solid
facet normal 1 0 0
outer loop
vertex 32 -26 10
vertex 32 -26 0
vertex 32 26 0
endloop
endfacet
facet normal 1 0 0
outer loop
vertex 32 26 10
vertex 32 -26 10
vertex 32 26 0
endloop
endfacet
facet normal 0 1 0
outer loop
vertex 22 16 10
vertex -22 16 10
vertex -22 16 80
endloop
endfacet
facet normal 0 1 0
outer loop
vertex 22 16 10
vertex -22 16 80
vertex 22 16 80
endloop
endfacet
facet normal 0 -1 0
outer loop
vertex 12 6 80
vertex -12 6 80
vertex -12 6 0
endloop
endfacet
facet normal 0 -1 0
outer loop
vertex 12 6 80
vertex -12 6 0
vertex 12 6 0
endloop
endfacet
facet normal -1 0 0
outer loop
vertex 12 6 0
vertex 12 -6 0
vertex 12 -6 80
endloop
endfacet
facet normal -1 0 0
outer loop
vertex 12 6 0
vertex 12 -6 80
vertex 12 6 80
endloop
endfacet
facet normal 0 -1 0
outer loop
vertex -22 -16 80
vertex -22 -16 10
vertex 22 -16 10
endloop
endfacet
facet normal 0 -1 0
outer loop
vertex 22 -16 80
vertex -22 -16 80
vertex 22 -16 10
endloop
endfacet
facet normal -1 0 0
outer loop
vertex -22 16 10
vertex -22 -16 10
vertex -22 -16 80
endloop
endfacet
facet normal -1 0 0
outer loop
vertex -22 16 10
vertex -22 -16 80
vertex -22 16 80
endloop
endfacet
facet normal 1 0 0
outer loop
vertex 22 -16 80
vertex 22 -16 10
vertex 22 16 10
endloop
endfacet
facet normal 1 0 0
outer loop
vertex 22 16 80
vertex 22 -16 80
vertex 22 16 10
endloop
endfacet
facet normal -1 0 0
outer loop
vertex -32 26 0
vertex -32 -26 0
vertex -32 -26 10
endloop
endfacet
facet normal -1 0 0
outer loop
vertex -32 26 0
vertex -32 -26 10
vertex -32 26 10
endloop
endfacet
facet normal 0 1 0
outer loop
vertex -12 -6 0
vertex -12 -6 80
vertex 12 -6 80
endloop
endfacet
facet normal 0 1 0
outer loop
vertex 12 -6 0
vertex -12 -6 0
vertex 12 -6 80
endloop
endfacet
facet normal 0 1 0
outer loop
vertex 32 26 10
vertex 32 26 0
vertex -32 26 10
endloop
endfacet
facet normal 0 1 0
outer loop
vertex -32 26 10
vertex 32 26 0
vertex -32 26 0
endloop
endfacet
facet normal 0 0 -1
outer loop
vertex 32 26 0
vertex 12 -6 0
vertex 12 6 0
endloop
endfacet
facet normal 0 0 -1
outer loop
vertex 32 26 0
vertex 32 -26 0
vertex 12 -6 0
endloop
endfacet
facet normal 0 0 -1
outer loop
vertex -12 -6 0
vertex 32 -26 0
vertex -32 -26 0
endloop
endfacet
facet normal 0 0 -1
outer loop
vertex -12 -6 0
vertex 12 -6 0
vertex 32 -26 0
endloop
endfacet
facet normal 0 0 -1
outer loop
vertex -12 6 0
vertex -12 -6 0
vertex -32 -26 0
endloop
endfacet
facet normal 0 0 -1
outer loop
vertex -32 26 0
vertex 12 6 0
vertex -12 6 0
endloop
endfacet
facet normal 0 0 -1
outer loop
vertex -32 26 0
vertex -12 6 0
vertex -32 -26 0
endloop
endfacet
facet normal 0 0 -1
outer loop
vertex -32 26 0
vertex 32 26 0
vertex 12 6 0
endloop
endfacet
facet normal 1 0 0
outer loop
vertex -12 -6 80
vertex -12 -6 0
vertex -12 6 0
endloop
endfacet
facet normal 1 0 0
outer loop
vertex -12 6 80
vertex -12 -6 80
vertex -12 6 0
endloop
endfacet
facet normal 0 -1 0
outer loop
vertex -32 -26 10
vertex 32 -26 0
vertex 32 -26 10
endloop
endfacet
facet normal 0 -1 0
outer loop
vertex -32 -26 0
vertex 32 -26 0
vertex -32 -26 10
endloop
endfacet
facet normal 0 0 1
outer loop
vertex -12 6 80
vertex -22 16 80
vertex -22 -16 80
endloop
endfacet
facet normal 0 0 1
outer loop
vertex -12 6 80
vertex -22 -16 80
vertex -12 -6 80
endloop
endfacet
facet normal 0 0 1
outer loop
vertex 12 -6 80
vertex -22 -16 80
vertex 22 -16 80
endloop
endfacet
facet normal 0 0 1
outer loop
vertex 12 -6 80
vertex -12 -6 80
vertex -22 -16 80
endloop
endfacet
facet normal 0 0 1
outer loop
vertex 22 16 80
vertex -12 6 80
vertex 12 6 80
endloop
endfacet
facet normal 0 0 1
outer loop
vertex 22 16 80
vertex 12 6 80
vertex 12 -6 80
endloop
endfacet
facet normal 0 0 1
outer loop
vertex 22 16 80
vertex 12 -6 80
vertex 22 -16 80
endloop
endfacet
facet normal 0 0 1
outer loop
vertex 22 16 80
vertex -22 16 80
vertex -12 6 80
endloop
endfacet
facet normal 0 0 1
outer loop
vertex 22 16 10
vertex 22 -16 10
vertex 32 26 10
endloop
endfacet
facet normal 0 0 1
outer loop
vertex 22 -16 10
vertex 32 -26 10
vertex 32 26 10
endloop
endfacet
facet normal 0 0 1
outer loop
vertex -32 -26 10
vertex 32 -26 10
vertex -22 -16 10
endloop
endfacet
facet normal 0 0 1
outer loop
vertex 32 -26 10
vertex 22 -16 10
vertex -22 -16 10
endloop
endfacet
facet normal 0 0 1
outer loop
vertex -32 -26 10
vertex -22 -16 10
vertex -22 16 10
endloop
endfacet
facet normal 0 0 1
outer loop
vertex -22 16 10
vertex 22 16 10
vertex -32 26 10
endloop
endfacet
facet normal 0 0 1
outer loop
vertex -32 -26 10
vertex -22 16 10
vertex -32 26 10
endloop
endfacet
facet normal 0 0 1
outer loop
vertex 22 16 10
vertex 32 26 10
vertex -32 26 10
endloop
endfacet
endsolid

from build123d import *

# Parameters (mm, degrees)
SKETCH_1_W      = 44
SKETCH_1_H      = 32
SKETCH_1_W_2    = 24
SKETCH_1_H_2    = 12
EXTRUDE_1_DEPTH = 80
SKETCH_2_W      = 64
SKETCH_2_H      = 52
SKETCH_2_W_2    = 44
SKETCH_2_H_2    = 32
EXTRUDE_2_DEPTH = 10


with BuildPart() as part:
    # 草图1 → 凸台-拉伸1 (new body)
    with BuildSketch(Plane.XY):
        Rectangle(SKETCH_1_W, SKETCH_1_H)
        Rectangle(SKETCH_1_W_2, SKETCH_1_H_2, mode=Mode.SUBTRACT)
    extrude(amount=EXTRUDE_1_DEPTH)

    # 草图2 → 凸台-拉伸2 (add)
    with BuildSketch(Plane(origin=(0, 0, 0), x_dir=(-1, 0, 0), z_dir=(0, 0, -1))):
        Rectangle(SKETCH_2_W, SKETCH_2_H)
        Rectangle(SKETCH_2_W_2, SKETCH_2_H_2, mode=Mode.SUBTRACT)
    extrude(amount=-EXTRUDE_2_DEPTH)


solid = part.part
